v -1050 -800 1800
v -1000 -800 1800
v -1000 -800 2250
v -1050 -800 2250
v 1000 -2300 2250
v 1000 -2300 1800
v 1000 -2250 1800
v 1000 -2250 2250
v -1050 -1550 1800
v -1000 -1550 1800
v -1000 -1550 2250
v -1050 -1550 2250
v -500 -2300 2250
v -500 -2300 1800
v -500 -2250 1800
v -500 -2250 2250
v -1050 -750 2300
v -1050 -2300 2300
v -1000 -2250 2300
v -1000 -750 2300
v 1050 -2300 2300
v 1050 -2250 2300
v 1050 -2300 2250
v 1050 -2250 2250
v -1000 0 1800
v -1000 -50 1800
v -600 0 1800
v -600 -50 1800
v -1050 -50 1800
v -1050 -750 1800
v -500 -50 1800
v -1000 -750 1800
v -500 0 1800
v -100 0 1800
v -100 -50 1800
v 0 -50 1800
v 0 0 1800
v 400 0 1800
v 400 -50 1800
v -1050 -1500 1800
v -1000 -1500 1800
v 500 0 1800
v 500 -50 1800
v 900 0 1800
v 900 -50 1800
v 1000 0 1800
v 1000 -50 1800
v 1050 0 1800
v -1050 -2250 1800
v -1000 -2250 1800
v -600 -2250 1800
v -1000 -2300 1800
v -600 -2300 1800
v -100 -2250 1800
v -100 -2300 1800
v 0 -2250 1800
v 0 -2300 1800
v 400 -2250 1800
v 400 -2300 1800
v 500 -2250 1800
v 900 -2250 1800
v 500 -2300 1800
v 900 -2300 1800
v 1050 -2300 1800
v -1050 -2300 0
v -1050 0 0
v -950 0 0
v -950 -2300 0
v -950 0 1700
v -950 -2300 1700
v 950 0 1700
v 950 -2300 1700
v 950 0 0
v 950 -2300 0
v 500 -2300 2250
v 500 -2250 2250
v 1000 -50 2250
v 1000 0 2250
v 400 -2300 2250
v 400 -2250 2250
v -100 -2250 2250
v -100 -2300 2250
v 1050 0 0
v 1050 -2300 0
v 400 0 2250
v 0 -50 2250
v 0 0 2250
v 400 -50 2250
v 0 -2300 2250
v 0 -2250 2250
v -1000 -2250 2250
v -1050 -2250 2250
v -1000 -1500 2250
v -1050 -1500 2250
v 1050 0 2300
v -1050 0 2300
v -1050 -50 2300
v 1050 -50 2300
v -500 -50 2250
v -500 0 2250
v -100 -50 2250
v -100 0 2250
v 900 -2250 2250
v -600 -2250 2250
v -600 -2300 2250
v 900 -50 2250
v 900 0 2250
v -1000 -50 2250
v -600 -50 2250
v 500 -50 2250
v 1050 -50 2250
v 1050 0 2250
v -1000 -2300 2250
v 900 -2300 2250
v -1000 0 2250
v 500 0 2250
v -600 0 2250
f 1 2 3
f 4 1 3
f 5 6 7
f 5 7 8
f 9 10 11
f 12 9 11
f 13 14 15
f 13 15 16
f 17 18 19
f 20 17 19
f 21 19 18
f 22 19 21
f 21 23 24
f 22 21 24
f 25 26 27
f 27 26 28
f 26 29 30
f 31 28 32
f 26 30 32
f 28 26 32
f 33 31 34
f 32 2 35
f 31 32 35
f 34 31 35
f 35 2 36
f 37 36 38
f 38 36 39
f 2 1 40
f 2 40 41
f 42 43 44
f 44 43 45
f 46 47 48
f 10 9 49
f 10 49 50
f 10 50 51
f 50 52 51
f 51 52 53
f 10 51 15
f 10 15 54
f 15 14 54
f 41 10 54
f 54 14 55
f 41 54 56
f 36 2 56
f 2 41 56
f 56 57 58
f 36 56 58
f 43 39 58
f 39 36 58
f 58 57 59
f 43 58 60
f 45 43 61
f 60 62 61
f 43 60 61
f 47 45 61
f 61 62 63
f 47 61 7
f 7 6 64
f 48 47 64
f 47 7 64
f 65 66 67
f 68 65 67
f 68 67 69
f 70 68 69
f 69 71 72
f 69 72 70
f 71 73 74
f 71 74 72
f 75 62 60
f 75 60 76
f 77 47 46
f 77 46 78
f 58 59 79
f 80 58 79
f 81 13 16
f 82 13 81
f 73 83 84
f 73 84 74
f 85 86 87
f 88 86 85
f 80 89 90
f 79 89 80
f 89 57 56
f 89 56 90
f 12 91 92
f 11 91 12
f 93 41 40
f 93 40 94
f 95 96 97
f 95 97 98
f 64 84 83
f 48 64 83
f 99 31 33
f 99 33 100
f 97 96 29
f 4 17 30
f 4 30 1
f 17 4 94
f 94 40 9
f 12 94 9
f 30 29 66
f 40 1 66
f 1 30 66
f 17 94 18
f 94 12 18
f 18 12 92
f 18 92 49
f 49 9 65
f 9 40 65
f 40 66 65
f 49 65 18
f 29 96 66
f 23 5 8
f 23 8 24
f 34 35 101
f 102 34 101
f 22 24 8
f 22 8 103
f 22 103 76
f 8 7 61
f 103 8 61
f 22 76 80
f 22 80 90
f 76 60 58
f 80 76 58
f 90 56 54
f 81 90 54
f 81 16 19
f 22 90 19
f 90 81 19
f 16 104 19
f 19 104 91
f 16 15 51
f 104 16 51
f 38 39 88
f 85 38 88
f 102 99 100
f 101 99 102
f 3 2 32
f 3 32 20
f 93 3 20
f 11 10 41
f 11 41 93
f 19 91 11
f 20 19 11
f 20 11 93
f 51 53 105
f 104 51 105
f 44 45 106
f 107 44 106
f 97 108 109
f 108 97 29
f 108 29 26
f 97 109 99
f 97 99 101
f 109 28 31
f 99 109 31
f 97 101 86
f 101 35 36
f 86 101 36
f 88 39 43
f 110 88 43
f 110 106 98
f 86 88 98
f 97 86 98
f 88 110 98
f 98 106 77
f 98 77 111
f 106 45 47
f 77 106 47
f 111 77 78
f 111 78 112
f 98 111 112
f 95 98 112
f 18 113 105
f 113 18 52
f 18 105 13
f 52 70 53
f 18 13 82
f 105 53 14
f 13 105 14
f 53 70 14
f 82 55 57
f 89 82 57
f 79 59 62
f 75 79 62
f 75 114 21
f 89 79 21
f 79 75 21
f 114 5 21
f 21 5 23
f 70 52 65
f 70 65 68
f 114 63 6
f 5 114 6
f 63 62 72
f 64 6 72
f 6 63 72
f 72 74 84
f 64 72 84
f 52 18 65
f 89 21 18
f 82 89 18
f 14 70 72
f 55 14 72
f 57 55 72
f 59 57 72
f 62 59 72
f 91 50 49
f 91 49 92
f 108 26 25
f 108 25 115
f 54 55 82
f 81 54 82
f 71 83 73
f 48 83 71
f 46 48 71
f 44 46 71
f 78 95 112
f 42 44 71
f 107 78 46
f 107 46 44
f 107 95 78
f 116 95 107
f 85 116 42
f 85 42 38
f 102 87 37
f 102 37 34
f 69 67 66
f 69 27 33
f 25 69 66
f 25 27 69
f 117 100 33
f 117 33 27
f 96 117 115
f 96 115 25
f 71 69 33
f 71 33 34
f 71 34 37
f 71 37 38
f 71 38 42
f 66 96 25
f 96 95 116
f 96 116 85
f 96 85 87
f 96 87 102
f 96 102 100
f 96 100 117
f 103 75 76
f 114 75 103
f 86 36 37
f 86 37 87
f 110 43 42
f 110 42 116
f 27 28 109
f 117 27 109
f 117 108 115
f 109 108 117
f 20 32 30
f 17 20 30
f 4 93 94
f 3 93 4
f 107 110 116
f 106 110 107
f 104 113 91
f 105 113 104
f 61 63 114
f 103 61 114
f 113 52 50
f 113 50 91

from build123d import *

# Parameters (mm, degrees)
F1_DEPTH = 2300
F4_DEPTH = 500
F5_W     = 400
F5_H     = 450
F6_DEPTH = 2300.001
F7_W     = 700
F7_H     = 450
F8_DEPTH = 50


with BuildPart() as f1:
    # F0 (on Front) → F1 (new body)
    with BuildSketch(Plane.XZ):
        Polygon((-1050, 1800), (-1050, 0), (-950, 0), (-950, 1700), (0, 1700), (0, 1800), align=None)
    extrude(amount=F1_DEPTH)

    # F2: F1 across plane


with BuildPart() as f1_1:
    add(f1.part)
    add(f1.part.mirror(Plane.YZ))

    # F3 (on face) → F4 (join)
    with BuildSketch(Plane.XY.offset(1800)):
        Polygon((-1050, -2300), (1050, -2300), (1050, -2250), (-1000, -2250), (-1000, -750), (-1050, -750), align=None)
        Polygon((1050, -50), (1050, 0), (-1050, 0), (-1050, -50), (-1000, -50), align=None)
    extrude(amount=F4_DEPTH)

    # F5 (on face) → F6 (cut, through all)
    with BuildSketch(Plane.XZ.offset(2300)):
        with Locations((-800, 2025)):
            Rectangle(F5_W, F5_H)
        with Locations((-300, 2025)):
            Rectangle(F5_W, F5_H)
        with Locations((200, 2025)):
            Rectangle(F5_W, F5_H)
        with Locations((700, 2025)):
            Rectangle(F5_W, F5_H)
        with Locations((1200, 2025)):
            Rectangle(F5_W, F5_H)
    extrude(amount=-F6_DEPTH, mode=Mode.SUBTRACT)

    # F7 (on face) → F8 (cut, through all)
    with BuildSketch(Plane.YZ.offset(-1000)):
        with Locations((-1900, 2025)):
            Rectangle(F7_W, F7_H)
        with Locations((-1150, 2025)):
            Rectangle(F7_W, F7_H)
    extrude(amount=-F8_DEPTH, mode=Mode.SUBTRACT)


solid = f1_1.part
